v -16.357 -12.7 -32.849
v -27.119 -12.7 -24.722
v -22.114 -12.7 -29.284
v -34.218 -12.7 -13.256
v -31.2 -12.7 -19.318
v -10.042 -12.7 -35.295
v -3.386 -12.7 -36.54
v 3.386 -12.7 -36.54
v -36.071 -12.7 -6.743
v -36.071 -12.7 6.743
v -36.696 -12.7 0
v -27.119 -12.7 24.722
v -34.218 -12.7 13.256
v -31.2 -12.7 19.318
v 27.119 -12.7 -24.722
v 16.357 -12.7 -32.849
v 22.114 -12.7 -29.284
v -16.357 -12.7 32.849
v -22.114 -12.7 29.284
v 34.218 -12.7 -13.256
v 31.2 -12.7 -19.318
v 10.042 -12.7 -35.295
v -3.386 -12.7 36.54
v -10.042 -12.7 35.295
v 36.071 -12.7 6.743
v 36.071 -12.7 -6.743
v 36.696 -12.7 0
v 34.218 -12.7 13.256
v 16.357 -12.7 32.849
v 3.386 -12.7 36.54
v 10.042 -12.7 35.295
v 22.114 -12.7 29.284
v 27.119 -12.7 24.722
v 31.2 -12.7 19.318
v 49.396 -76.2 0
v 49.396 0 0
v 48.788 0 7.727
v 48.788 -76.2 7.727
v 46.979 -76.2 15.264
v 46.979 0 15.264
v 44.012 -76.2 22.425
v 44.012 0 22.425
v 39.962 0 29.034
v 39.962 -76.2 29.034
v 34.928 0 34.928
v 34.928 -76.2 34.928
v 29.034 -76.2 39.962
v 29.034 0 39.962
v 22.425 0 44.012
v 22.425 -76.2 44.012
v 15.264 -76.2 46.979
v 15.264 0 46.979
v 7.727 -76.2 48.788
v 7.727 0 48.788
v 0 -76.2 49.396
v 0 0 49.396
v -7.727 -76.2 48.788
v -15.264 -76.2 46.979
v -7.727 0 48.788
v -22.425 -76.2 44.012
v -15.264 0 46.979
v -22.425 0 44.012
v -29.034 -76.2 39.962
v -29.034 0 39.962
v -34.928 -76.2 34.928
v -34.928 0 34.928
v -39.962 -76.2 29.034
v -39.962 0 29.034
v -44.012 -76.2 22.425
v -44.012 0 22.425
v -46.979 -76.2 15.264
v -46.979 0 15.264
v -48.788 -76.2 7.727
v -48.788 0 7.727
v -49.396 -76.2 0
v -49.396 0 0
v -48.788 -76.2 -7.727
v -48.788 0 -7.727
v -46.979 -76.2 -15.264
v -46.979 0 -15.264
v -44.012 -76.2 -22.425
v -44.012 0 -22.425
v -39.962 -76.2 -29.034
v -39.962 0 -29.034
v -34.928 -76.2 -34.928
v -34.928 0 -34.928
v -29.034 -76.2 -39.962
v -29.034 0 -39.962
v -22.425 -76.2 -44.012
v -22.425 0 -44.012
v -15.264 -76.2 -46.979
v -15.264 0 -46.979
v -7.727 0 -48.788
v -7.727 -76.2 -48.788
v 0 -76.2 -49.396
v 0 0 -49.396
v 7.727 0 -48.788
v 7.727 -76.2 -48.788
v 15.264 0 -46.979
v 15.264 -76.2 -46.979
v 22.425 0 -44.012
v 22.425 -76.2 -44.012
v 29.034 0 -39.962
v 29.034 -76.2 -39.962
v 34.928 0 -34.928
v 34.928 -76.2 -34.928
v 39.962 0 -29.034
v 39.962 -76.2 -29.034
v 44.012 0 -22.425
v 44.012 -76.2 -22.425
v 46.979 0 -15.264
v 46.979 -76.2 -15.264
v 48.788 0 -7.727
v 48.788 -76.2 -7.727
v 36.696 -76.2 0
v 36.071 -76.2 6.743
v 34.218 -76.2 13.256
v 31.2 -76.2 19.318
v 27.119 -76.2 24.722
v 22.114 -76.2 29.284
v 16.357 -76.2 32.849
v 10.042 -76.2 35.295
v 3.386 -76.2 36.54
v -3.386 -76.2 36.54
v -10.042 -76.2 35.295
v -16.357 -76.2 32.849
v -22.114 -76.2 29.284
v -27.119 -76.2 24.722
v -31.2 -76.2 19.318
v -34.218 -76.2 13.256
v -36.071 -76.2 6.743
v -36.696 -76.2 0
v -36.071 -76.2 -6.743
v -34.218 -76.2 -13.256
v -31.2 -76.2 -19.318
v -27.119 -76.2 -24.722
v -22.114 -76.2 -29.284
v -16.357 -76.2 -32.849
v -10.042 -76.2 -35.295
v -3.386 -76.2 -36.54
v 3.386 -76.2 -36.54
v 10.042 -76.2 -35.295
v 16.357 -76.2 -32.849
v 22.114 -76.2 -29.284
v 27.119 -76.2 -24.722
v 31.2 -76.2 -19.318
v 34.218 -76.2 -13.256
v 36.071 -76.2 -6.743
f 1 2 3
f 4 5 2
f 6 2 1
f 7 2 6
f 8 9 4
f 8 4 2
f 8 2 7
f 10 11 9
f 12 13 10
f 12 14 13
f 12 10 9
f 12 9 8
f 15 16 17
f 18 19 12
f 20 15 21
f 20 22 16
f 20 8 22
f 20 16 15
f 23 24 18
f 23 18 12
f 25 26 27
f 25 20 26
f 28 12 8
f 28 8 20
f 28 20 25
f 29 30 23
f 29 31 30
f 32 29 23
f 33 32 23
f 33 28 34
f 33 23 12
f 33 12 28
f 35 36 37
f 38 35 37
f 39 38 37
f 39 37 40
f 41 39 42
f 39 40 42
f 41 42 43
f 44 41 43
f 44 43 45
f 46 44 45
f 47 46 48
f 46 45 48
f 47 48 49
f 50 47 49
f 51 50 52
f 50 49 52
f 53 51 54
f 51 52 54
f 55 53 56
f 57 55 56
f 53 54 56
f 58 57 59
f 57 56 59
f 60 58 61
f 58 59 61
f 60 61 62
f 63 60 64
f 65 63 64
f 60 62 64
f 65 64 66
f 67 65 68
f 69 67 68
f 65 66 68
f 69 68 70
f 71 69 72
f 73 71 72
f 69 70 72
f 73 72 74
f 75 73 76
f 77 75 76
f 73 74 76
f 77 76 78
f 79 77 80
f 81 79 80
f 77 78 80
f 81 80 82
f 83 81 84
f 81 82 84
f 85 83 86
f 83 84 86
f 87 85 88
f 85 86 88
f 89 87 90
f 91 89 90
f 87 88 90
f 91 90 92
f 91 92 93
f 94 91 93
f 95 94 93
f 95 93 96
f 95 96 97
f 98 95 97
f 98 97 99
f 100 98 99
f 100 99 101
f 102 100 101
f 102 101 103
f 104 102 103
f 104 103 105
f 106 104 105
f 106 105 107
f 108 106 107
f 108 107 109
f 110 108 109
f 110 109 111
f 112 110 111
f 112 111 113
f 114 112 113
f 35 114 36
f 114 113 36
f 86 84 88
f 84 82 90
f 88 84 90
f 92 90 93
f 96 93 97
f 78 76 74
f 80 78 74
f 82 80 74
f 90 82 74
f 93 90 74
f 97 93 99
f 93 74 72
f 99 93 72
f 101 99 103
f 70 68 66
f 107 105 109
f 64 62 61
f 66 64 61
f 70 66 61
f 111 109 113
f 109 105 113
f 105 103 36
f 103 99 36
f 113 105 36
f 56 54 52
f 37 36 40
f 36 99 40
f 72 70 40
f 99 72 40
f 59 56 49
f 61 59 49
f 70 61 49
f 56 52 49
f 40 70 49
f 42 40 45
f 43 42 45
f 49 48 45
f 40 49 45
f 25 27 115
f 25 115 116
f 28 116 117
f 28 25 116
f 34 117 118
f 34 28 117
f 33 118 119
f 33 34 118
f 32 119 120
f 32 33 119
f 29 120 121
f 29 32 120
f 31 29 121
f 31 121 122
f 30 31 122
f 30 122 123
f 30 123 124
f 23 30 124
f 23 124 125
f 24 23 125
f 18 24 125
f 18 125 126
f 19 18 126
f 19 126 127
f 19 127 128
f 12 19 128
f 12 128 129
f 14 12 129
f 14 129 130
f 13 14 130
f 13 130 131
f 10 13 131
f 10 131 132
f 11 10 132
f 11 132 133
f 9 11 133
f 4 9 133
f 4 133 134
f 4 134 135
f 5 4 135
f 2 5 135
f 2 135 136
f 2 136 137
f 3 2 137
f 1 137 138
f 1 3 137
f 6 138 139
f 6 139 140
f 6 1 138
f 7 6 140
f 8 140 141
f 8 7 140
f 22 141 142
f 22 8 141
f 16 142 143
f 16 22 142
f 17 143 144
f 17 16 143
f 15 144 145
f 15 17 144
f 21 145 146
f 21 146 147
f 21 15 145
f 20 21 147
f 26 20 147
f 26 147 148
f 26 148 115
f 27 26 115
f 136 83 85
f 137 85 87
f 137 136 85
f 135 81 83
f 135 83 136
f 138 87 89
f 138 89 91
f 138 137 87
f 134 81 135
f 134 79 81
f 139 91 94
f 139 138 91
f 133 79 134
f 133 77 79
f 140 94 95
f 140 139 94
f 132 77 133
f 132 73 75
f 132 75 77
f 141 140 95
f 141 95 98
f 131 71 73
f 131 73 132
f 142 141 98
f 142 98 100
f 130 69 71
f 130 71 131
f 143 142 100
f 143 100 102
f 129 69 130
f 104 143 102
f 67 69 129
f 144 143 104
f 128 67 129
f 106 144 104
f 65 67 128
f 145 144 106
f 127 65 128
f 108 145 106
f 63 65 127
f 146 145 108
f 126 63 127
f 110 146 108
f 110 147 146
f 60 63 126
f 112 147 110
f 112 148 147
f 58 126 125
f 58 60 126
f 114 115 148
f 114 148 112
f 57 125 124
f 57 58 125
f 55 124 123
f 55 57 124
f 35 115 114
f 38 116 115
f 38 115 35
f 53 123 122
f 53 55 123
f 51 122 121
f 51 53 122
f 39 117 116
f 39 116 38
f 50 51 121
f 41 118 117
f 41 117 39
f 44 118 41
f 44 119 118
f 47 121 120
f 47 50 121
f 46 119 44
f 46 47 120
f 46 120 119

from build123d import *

# Parameters (mm, degrees)
F0_R     = 49.396191
F1_DEPTH = 76.2
F2_R     = 23.861127
F3_DEPTH = 50.8
F4_T     = -12.7


with BuildPart() as f1:
    # F0 (on Front) → F1 (new body)
    with BuildSketch(Plane.XZ):
        Circle(F0_R)
    extrude(amount=F1_DEPTH)

    # F2 (on Front) → F3 (join)
    with BuildSketch(Plane.XZ):
        Circle(F2_R)
    extrude(amount=F3_DEPTH)

    # F4
    f4_openings = [f1.faces().sort_by_distance(p)[0] for p in [
        (0, -76.2, 0),
    ]]
    offset(amount=F4_T, openings=f4_openings)


solid = f1.part
